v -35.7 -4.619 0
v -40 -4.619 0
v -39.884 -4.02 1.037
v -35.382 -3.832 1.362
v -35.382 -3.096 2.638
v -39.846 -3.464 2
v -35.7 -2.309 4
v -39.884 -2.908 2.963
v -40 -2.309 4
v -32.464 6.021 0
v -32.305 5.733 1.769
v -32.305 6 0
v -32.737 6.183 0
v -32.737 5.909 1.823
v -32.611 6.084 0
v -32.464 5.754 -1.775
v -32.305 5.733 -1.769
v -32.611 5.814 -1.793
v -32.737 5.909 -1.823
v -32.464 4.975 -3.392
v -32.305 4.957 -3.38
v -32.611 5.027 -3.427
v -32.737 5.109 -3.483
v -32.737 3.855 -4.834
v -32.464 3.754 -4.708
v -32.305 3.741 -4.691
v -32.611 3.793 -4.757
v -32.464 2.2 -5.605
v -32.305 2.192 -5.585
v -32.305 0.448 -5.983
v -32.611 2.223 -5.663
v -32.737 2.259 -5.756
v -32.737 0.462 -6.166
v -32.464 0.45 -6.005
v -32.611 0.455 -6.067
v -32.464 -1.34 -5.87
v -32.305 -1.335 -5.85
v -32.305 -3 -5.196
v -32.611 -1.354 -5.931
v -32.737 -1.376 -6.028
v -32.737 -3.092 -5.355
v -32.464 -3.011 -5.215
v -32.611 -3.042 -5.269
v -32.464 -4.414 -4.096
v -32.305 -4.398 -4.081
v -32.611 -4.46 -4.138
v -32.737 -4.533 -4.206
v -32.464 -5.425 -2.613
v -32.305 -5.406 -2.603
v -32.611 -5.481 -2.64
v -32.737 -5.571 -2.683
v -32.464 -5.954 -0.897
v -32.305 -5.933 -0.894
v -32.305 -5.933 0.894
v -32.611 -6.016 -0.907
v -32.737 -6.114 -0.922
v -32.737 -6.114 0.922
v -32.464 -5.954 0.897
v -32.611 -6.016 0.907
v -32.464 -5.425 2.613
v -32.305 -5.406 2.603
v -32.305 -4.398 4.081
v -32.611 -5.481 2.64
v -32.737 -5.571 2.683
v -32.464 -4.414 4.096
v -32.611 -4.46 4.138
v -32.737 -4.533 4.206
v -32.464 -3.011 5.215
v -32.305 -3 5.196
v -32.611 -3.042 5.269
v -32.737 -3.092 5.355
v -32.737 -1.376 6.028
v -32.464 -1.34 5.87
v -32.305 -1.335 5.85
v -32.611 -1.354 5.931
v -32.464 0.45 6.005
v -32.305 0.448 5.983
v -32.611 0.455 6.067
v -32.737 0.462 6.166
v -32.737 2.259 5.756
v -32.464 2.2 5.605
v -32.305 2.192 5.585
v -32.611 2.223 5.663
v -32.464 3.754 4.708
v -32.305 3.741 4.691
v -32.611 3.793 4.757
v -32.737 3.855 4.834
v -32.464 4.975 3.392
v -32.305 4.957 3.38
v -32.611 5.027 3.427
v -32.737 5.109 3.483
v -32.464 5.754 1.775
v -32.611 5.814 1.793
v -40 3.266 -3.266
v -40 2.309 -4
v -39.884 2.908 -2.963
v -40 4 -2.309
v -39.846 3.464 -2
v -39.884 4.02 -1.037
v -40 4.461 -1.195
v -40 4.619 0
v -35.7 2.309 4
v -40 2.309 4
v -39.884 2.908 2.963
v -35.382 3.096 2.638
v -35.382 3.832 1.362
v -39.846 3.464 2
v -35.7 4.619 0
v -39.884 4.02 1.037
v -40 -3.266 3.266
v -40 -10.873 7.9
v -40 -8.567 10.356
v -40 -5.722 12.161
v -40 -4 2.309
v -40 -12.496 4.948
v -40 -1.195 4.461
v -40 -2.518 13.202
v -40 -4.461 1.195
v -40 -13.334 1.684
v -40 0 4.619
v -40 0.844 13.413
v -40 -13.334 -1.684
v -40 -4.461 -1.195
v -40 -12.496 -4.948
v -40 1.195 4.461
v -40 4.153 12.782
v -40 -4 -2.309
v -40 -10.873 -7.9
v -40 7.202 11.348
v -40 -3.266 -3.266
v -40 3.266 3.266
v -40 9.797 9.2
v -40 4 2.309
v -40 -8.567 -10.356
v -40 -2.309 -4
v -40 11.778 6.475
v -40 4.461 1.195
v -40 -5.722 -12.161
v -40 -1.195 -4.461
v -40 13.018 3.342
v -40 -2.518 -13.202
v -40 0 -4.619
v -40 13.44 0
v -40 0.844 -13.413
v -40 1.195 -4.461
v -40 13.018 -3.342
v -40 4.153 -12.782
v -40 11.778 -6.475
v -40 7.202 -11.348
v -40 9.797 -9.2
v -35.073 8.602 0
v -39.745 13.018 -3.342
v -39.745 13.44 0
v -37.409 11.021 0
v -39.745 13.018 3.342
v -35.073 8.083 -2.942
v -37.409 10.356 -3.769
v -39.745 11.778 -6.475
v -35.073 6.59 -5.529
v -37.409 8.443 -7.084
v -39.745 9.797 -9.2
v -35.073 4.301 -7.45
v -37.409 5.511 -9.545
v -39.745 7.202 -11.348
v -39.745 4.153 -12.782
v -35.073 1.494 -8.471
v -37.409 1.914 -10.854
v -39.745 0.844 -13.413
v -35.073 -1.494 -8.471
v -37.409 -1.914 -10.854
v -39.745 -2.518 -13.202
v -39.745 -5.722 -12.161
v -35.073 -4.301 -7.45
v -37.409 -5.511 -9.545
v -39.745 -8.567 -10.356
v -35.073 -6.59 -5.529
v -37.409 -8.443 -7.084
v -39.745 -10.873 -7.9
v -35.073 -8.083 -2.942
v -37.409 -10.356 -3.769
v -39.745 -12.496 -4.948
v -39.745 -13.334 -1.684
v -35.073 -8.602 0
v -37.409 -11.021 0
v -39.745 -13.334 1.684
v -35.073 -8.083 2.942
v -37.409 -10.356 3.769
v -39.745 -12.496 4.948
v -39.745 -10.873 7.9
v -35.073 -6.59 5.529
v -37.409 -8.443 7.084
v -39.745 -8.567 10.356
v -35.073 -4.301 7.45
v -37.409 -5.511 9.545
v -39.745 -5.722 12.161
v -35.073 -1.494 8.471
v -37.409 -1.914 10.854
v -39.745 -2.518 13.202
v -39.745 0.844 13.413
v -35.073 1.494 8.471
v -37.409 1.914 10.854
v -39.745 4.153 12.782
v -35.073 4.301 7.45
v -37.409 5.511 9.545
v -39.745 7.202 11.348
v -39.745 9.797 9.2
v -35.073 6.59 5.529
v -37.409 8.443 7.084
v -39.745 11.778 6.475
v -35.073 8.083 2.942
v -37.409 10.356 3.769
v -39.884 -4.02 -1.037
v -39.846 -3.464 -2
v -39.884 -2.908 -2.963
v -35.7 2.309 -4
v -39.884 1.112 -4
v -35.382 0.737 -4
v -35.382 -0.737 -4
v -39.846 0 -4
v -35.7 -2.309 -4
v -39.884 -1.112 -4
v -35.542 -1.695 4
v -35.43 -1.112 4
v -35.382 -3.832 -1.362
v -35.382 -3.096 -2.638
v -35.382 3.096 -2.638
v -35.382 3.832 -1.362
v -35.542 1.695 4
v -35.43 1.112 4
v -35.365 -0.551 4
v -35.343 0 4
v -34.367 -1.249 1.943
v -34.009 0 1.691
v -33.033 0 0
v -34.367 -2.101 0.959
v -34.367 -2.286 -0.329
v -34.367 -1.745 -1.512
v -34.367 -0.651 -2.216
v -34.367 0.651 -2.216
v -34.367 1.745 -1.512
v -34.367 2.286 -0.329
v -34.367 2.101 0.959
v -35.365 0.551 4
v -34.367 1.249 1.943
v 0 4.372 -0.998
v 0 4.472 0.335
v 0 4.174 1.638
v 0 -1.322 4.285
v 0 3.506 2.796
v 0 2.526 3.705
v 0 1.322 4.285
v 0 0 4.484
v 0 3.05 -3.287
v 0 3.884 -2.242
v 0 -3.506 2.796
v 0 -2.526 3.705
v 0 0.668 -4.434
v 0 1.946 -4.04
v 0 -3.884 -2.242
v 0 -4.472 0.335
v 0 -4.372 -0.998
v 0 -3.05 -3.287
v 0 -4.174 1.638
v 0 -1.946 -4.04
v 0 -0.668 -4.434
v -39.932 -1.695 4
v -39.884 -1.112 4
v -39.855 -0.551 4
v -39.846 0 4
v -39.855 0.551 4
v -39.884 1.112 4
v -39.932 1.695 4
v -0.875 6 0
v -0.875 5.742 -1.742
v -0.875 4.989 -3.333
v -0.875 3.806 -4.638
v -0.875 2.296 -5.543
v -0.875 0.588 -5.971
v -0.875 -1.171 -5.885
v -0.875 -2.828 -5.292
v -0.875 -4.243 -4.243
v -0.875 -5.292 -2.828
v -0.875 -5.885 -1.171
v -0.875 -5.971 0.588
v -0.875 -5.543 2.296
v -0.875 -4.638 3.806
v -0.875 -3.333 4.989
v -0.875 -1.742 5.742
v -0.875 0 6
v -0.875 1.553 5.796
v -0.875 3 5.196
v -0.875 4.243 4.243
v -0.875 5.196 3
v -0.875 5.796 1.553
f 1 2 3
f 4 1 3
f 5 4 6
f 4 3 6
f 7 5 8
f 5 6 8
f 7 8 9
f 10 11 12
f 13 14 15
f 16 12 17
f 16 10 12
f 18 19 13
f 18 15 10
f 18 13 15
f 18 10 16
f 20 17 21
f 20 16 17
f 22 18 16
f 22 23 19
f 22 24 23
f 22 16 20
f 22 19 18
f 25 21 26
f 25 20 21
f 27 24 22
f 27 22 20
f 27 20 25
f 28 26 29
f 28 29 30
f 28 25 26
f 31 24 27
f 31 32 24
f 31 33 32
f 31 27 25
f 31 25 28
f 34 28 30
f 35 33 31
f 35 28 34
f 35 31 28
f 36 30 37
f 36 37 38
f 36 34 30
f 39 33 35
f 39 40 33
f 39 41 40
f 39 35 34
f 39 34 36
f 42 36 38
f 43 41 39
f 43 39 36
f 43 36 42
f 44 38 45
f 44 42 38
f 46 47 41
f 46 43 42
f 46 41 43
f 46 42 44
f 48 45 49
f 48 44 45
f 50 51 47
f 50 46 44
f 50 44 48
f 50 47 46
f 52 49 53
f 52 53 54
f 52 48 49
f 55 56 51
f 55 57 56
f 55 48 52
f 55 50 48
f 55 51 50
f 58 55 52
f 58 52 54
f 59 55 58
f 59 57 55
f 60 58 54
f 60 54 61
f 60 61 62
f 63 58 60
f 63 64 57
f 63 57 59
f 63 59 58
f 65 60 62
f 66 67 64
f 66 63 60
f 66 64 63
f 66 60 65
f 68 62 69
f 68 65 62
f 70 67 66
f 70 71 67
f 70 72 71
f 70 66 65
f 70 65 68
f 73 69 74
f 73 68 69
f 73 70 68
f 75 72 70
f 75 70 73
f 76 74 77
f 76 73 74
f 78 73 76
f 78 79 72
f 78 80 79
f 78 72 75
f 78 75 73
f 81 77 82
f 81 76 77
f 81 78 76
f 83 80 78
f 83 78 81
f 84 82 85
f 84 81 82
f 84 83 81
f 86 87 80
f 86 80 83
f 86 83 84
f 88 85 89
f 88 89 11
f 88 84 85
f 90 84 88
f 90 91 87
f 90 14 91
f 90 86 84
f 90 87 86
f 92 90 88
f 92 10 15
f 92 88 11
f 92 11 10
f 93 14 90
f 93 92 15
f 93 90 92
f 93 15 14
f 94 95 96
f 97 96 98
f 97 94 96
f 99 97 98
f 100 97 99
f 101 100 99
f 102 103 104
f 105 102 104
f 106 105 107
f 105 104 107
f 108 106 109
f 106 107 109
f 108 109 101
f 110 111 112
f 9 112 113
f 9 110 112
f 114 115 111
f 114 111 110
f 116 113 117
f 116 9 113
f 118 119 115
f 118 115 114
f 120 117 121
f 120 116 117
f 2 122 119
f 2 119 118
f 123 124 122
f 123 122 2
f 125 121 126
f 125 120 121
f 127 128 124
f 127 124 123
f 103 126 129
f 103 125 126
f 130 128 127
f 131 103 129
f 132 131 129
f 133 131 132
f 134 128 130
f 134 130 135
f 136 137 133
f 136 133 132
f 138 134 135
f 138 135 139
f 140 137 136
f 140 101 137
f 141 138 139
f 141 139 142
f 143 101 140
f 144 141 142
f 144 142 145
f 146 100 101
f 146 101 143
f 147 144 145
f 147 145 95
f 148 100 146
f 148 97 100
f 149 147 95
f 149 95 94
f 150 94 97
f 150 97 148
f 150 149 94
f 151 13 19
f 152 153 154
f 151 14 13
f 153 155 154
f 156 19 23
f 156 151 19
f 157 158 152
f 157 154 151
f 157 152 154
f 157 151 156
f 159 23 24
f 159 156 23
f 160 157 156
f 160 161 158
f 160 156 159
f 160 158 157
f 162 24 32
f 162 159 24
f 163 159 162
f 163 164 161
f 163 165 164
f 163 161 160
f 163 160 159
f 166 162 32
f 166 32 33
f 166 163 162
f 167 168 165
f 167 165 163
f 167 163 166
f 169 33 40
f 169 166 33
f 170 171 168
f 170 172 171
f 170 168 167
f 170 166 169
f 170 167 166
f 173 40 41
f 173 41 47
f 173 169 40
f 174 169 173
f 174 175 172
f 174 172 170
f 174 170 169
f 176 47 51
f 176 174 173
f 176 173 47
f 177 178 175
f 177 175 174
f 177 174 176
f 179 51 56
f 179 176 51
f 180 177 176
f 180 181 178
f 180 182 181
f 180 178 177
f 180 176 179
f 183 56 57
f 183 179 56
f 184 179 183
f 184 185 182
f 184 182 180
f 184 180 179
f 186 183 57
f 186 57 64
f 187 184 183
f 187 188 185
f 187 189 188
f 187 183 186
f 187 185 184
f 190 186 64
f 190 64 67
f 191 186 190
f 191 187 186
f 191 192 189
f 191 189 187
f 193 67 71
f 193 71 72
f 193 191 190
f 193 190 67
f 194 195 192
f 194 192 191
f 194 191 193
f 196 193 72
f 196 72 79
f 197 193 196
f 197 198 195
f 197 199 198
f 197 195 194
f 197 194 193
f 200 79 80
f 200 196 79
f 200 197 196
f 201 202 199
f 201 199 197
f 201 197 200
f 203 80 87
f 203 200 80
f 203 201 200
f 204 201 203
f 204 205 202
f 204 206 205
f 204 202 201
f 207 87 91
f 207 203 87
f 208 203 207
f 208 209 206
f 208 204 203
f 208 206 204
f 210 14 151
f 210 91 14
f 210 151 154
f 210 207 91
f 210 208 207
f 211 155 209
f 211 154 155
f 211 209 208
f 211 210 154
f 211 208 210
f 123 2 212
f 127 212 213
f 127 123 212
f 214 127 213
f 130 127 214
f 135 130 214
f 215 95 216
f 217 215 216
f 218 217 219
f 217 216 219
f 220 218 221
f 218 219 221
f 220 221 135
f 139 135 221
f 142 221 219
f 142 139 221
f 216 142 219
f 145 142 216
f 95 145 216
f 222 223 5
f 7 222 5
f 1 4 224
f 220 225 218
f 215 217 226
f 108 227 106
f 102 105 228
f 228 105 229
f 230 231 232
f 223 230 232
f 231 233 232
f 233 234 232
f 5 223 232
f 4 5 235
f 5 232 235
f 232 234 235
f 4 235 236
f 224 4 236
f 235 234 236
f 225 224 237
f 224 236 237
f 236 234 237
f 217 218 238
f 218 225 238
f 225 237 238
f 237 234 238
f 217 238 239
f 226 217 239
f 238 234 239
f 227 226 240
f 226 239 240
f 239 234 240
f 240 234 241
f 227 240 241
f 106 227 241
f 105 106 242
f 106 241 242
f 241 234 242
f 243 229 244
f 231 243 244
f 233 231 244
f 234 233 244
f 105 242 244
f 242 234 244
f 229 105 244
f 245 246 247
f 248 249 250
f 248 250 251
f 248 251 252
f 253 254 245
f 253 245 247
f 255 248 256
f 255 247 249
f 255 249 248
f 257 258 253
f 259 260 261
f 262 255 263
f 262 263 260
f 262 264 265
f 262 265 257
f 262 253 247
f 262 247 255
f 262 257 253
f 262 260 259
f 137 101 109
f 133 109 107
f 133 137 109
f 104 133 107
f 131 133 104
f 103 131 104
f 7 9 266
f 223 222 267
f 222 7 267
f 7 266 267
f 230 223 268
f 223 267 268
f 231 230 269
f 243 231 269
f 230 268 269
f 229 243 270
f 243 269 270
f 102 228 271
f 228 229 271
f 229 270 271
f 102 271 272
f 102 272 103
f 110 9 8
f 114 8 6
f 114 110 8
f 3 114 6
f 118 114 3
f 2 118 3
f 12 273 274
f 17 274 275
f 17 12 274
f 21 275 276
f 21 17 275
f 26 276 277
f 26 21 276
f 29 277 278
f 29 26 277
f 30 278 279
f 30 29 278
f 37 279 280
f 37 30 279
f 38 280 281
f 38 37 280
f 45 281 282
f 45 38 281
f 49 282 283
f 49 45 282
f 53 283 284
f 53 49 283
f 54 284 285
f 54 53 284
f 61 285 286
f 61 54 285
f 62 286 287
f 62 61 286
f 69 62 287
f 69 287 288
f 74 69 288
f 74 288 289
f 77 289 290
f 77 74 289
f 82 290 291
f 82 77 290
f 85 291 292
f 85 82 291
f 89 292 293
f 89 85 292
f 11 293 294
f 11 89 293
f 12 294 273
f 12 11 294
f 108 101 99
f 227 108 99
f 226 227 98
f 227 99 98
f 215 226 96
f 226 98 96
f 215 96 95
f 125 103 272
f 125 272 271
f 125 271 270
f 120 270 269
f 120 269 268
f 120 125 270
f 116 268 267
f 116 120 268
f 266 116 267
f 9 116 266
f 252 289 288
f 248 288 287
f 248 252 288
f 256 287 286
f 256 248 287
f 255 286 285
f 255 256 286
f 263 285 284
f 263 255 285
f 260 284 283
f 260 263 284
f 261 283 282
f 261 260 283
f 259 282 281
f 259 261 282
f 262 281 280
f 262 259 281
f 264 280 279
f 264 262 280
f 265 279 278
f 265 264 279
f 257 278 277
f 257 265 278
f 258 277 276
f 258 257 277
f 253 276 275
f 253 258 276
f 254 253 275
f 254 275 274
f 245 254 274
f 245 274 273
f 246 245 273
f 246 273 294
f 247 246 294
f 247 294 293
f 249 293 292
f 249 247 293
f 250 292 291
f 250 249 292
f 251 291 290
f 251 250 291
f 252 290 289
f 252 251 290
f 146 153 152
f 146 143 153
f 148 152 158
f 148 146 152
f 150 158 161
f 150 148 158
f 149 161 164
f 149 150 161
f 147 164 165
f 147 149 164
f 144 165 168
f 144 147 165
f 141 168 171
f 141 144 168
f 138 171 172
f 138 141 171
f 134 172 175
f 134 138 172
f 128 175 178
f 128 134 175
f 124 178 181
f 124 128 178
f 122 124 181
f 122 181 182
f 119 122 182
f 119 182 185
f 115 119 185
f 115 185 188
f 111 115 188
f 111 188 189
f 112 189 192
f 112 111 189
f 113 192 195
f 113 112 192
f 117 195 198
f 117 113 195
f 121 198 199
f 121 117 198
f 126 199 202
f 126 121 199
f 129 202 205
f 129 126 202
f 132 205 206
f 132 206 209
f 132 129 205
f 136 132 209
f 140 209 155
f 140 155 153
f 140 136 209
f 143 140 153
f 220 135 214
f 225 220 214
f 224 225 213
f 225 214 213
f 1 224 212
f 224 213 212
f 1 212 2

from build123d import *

# Parameters (mm, degrees)
CUT_EXTRUDE_1_DEPTH = 7.44


with BuildPart() as part:
    # 草图1 → 旋转1 (revolve)
    with BuildSketch(Plane.XY):
        with BuildLine():
            Line((0, 6), (-32.30531511, 6))
            ThreePointArc((-32.30531511, 6), (-32.539753787, 6.047697088), (-32.73691899, 6.183204978))
            Line((-32.73691899, 6.183204978), (-39.744724485, 13.44))
            Line((-39.744724485, 13.44), (-40, 13.44))
            Line((-40, 13.44), (-40, 0))
            Line((-40, 0), (0, 0))
            Line((0, 0), (0, 6))
        make_face()
    revolve(axis=Axis((0, 0, 0), (-1, 0, 0)))

    # 草图2 → 切除-拉伸1 (cut)
    with BuildSketch(Plane.ZY.offset(40)):
        Polygon((0, 4.618802154), (-4, 2.309401077), (-4, -2.309401077), (0, -4.618802154), (4, -2.309401077), (4, 2.309401077), align=None)
    extrude(amount=-CUT_EXTRUDE_1_DEPTH, mode=Mode.SUBTRACT)

    # 草图6 → 旋转2 (revolve)
    with BuildSketch(Plane.XY):
        Polygon((-35.7, 4.618802154), (-33.033333333, 0), (-31.41, 0), (-31.41, 4.618802154), align=None)
    revolve(axis=Axis((-40, 0, 0), (1, 0, 0)))

    # 草图7 → 切除-旋转2 (revolve, cut)
    with BuildSketch(Plane.XY):
        Polygon((-40, 4.618802154), (-40, 0), (-38.85, 0), align=None)
    revolve(axis=Axis((-40, 0, 0), (1, 0, 0)), mode=Mode.SUBTRACT)

    # 草图4 → 切除-旋转1 (revolve, cut)
    with BuildSketch(Plane.XY):
        Polygon((-0.875, 6), (0, 4.484455543), (0.875, 6), align=None)
    revolve(axis=Axis((-0.875, 0, 0), (1, 0, 0)), mode=Mode.SUBTRACT)


solid = part.part
